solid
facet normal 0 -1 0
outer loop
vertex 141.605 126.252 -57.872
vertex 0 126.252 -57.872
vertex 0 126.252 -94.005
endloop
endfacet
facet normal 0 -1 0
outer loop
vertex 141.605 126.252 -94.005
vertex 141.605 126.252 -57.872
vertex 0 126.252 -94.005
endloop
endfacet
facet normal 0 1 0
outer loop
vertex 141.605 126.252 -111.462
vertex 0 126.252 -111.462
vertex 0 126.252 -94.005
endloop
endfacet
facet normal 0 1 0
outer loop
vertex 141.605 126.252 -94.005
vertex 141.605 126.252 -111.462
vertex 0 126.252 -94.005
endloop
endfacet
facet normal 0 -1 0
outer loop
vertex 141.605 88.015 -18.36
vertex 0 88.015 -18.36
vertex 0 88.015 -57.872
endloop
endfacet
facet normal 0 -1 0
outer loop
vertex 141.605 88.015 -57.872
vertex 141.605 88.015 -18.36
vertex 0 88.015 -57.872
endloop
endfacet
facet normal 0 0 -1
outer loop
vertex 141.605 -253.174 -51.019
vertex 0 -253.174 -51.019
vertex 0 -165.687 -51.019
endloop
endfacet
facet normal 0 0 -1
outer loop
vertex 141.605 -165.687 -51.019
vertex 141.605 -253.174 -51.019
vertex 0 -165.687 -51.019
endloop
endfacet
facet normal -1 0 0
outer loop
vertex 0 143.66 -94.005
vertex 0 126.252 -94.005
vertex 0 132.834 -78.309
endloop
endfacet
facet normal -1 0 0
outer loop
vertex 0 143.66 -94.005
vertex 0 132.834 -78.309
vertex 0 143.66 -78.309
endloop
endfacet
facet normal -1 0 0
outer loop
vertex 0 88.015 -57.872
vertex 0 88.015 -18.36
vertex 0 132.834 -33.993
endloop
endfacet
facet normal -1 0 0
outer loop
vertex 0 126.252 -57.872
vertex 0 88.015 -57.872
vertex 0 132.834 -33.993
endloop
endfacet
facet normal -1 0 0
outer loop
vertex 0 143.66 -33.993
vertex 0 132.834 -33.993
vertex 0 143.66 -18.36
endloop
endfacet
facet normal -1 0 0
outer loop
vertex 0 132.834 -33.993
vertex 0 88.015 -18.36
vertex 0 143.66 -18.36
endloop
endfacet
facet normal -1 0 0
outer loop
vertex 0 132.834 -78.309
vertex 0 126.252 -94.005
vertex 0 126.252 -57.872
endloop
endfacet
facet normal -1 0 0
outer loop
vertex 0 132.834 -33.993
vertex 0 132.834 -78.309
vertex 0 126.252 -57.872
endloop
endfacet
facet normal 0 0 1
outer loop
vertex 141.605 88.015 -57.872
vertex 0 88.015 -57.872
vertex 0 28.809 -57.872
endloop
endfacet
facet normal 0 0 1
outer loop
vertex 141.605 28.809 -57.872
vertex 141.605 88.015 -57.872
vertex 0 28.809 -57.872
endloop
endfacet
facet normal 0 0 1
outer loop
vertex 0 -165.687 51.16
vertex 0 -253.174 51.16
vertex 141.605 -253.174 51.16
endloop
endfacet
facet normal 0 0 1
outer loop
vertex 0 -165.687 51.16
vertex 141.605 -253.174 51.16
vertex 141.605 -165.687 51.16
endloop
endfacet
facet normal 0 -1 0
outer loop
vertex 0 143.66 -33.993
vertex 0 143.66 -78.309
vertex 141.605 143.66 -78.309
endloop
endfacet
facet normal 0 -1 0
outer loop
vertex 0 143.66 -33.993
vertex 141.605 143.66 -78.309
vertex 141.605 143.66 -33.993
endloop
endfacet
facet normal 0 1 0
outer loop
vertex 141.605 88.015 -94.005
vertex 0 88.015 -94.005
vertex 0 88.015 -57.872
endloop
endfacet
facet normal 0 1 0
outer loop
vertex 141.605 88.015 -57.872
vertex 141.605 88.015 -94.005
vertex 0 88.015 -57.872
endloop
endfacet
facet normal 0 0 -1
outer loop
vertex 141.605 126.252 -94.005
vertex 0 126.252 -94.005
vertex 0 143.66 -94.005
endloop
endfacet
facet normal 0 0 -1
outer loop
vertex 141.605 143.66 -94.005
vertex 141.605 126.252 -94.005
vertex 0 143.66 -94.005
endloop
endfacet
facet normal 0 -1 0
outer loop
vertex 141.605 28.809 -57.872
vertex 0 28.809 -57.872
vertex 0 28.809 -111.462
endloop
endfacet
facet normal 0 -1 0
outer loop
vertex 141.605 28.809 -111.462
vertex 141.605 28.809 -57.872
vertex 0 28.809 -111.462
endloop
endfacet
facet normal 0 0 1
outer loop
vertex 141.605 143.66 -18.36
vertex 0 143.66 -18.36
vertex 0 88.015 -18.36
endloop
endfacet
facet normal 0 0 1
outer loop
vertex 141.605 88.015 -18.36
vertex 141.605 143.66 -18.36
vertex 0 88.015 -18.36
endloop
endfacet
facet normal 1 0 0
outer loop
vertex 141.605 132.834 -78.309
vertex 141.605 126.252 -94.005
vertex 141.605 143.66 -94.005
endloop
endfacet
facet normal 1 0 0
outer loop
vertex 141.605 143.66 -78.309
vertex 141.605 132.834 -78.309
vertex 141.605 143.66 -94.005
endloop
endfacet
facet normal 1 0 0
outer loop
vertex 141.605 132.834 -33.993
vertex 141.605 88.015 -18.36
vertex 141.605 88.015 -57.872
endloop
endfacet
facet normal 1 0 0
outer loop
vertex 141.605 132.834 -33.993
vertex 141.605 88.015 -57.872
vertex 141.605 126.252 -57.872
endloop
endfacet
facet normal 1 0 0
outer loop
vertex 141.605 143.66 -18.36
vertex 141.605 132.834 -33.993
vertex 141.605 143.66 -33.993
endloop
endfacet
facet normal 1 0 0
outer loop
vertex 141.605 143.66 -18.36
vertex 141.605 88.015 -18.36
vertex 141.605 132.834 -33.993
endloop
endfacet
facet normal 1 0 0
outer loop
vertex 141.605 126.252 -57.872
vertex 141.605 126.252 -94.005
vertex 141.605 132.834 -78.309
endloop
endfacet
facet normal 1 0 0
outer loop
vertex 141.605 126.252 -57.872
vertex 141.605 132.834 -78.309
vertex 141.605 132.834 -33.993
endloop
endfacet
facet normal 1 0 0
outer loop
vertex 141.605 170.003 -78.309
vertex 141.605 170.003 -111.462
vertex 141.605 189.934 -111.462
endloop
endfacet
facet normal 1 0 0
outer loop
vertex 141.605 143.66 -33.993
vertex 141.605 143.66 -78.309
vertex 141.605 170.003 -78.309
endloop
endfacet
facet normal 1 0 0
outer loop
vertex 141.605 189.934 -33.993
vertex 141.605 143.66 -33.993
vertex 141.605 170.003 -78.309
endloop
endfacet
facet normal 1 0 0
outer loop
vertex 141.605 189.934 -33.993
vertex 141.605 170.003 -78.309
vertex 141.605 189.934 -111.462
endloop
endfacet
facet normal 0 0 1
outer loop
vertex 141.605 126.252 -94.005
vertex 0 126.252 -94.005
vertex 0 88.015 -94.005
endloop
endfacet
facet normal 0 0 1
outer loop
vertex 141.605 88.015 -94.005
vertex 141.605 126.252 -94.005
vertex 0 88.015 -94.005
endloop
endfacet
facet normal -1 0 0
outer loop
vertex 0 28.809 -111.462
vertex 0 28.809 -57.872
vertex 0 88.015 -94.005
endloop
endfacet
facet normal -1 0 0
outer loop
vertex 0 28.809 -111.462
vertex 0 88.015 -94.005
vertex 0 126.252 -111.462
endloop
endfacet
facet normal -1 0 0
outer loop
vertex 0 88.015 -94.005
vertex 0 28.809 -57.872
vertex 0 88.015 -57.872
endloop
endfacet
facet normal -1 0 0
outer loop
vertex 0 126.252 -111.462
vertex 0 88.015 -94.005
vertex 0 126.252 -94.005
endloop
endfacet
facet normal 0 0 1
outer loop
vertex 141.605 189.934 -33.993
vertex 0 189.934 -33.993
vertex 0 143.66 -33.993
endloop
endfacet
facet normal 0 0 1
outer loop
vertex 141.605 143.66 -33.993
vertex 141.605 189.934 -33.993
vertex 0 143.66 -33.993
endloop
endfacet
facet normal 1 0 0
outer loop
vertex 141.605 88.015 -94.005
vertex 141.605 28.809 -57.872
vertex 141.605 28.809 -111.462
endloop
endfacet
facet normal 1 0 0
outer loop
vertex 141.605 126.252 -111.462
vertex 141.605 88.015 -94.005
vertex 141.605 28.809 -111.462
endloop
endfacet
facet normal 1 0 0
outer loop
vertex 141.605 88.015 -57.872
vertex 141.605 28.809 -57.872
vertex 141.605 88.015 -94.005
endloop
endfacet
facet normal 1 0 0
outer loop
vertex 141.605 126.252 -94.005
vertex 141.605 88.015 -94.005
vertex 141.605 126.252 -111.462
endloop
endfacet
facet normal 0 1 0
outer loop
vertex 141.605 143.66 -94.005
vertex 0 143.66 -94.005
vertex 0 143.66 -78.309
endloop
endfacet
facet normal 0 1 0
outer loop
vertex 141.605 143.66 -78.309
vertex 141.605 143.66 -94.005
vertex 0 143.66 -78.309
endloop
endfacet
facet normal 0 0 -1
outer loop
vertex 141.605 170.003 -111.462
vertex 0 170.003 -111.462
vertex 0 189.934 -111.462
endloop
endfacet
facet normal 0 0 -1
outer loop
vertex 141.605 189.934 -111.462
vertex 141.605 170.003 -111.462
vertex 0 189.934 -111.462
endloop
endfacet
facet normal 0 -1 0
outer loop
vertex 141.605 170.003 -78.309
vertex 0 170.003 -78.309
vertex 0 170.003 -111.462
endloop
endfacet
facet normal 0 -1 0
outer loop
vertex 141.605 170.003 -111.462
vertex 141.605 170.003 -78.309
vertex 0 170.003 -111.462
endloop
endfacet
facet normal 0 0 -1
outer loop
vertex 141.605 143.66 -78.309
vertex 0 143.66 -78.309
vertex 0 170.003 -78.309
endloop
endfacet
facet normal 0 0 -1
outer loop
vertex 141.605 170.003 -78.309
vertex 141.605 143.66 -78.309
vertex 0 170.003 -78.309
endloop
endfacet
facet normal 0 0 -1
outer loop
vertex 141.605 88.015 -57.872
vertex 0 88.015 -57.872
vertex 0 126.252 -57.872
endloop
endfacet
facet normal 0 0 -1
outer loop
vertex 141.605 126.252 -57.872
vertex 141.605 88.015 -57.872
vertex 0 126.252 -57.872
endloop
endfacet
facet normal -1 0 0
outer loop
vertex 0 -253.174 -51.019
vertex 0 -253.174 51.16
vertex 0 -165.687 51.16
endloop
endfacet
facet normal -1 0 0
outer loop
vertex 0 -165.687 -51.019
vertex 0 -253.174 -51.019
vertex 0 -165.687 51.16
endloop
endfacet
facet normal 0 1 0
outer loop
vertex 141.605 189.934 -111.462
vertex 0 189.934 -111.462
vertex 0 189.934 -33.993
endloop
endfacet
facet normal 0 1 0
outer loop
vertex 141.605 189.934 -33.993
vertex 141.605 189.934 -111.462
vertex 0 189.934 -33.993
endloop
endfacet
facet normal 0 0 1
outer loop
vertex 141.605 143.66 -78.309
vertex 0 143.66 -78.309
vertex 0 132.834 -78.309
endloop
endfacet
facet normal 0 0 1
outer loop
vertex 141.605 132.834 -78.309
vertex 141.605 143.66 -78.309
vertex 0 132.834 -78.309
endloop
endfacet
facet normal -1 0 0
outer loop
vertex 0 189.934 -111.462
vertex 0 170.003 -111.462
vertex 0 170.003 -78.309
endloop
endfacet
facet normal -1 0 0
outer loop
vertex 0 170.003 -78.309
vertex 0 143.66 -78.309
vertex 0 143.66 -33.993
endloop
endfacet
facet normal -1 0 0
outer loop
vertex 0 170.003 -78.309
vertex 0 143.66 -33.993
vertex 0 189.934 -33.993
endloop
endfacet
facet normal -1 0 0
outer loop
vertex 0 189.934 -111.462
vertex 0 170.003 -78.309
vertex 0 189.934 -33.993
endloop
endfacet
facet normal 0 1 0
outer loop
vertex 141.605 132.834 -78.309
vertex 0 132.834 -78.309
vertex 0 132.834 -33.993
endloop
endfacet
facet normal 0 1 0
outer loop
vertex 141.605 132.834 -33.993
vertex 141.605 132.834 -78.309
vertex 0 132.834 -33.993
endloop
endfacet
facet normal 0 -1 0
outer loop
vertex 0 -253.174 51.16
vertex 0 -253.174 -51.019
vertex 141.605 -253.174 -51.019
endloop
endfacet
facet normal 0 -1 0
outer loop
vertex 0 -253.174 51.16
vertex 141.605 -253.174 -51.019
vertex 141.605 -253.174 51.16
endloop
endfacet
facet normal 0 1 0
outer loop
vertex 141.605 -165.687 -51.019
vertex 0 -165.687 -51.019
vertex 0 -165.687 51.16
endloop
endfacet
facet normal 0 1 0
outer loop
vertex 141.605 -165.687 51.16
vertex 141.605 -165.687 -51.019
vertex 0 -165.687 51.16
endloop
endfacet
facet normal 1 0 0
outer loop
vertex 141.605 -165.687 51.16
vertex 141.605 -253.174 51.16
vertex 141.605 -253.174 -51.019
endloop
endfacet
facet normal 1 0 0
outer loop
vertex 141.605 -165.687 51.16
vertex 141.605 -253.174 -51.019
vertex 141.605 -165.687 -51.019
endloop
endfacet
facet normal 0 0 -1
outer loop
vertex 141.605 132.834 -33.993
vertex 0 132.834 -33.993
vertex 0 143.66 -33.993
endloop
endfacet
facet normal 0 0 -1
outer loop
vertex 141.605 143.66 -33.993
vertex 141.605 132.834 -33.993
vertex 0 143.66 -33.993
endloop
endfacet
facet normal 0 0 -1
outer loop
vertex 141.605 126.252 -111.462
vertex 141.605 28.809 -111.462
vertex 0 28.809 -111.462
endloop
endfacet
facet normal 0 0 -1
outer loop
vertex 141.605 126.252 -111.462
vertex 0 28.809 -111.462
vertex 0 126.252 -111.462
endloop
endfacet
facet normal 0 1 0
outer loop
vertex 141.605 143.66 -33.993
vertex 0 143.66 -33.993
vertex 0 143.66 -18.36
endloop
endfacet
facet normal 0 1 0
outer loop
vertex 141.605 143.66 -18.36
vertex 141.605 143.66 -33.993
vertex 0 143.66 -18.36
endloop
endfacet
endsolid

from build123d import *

# Parameters (mm, degrees)
F1_DEPTH = 141.605
F0_W     = 19.9309587479
F0_H     = 44.3162918091
F0_H_2   = 33.1525355577
F0_W_2   = 26.3430923223
F0_W_3   = 87.48665452
F0_H_3   = 102.1797172725


with BuildPart() as f1:
    # F0 (on Right) → F1 (new body)
    with BuildSketch(Plane.YZ):
        Polygon((88.0146995187, -94.0050780773), (88.0146995187, -57.8717216849), (28.8094133139, -57.8717216849), (28.8094133139, -111.4616468549), (126.2522339821, -111.4616468549), (126.2522339821, -94.0050780773), align=None)
    extrude(amount=F1_DEPTH)


with BuildPart() as f1b:
    # F0 (on Right) → F1, piece 2 (new body)
    with BuildSketch(Plane.YZ):
        with Locations((179.9681186676, -56.1509653926)):
            Rectangle(F0_W, F0_H)
        with Locations((179.9681186676, -94.885379076)):
            Rectangle(F0_W, F0_H_2)
        with Locations((156.8310931325, -56.1509653926)):
            Rectangle(F0_W_2, F0_H)
    extrude(amount=F1_DEPTH)


with BuildPart() as f1c:
    # F0 (on Right) → F1, piece 3 (new body)
    with BuildSketch(Plane.YZ):
        Polygon((143.6595469713, -33.992819488), (143.6595469713, -18.3596462011), (88.0146995187, -18.3596462011), (88.0146995187, -57.8717216849), (126.2522339821, -57.8717216849), (126.2522339821, -94.0050780773), (143.6595469713, -94.0050780773), (143.6595469713, -78.3091112971), (132.8343451023, -78.3091112971), (132.8343451023, -33.992819488), align=None)
    extrude(amount=F1_DEPTH)


with BuildPart() as f1d:
    # F0 (on Right) → F1, piece 4 (new body)
    with BuildSketch(Plane.YZ):
        with Locations((-209.4305902719, 0.0704359263)):
            Rectangle(F0_W_3, F0_H_3)
    extrude(amount=F1_DEPTH)


solid = Compound([f1.part, f1b.part, f1c.part, f1d.part])
